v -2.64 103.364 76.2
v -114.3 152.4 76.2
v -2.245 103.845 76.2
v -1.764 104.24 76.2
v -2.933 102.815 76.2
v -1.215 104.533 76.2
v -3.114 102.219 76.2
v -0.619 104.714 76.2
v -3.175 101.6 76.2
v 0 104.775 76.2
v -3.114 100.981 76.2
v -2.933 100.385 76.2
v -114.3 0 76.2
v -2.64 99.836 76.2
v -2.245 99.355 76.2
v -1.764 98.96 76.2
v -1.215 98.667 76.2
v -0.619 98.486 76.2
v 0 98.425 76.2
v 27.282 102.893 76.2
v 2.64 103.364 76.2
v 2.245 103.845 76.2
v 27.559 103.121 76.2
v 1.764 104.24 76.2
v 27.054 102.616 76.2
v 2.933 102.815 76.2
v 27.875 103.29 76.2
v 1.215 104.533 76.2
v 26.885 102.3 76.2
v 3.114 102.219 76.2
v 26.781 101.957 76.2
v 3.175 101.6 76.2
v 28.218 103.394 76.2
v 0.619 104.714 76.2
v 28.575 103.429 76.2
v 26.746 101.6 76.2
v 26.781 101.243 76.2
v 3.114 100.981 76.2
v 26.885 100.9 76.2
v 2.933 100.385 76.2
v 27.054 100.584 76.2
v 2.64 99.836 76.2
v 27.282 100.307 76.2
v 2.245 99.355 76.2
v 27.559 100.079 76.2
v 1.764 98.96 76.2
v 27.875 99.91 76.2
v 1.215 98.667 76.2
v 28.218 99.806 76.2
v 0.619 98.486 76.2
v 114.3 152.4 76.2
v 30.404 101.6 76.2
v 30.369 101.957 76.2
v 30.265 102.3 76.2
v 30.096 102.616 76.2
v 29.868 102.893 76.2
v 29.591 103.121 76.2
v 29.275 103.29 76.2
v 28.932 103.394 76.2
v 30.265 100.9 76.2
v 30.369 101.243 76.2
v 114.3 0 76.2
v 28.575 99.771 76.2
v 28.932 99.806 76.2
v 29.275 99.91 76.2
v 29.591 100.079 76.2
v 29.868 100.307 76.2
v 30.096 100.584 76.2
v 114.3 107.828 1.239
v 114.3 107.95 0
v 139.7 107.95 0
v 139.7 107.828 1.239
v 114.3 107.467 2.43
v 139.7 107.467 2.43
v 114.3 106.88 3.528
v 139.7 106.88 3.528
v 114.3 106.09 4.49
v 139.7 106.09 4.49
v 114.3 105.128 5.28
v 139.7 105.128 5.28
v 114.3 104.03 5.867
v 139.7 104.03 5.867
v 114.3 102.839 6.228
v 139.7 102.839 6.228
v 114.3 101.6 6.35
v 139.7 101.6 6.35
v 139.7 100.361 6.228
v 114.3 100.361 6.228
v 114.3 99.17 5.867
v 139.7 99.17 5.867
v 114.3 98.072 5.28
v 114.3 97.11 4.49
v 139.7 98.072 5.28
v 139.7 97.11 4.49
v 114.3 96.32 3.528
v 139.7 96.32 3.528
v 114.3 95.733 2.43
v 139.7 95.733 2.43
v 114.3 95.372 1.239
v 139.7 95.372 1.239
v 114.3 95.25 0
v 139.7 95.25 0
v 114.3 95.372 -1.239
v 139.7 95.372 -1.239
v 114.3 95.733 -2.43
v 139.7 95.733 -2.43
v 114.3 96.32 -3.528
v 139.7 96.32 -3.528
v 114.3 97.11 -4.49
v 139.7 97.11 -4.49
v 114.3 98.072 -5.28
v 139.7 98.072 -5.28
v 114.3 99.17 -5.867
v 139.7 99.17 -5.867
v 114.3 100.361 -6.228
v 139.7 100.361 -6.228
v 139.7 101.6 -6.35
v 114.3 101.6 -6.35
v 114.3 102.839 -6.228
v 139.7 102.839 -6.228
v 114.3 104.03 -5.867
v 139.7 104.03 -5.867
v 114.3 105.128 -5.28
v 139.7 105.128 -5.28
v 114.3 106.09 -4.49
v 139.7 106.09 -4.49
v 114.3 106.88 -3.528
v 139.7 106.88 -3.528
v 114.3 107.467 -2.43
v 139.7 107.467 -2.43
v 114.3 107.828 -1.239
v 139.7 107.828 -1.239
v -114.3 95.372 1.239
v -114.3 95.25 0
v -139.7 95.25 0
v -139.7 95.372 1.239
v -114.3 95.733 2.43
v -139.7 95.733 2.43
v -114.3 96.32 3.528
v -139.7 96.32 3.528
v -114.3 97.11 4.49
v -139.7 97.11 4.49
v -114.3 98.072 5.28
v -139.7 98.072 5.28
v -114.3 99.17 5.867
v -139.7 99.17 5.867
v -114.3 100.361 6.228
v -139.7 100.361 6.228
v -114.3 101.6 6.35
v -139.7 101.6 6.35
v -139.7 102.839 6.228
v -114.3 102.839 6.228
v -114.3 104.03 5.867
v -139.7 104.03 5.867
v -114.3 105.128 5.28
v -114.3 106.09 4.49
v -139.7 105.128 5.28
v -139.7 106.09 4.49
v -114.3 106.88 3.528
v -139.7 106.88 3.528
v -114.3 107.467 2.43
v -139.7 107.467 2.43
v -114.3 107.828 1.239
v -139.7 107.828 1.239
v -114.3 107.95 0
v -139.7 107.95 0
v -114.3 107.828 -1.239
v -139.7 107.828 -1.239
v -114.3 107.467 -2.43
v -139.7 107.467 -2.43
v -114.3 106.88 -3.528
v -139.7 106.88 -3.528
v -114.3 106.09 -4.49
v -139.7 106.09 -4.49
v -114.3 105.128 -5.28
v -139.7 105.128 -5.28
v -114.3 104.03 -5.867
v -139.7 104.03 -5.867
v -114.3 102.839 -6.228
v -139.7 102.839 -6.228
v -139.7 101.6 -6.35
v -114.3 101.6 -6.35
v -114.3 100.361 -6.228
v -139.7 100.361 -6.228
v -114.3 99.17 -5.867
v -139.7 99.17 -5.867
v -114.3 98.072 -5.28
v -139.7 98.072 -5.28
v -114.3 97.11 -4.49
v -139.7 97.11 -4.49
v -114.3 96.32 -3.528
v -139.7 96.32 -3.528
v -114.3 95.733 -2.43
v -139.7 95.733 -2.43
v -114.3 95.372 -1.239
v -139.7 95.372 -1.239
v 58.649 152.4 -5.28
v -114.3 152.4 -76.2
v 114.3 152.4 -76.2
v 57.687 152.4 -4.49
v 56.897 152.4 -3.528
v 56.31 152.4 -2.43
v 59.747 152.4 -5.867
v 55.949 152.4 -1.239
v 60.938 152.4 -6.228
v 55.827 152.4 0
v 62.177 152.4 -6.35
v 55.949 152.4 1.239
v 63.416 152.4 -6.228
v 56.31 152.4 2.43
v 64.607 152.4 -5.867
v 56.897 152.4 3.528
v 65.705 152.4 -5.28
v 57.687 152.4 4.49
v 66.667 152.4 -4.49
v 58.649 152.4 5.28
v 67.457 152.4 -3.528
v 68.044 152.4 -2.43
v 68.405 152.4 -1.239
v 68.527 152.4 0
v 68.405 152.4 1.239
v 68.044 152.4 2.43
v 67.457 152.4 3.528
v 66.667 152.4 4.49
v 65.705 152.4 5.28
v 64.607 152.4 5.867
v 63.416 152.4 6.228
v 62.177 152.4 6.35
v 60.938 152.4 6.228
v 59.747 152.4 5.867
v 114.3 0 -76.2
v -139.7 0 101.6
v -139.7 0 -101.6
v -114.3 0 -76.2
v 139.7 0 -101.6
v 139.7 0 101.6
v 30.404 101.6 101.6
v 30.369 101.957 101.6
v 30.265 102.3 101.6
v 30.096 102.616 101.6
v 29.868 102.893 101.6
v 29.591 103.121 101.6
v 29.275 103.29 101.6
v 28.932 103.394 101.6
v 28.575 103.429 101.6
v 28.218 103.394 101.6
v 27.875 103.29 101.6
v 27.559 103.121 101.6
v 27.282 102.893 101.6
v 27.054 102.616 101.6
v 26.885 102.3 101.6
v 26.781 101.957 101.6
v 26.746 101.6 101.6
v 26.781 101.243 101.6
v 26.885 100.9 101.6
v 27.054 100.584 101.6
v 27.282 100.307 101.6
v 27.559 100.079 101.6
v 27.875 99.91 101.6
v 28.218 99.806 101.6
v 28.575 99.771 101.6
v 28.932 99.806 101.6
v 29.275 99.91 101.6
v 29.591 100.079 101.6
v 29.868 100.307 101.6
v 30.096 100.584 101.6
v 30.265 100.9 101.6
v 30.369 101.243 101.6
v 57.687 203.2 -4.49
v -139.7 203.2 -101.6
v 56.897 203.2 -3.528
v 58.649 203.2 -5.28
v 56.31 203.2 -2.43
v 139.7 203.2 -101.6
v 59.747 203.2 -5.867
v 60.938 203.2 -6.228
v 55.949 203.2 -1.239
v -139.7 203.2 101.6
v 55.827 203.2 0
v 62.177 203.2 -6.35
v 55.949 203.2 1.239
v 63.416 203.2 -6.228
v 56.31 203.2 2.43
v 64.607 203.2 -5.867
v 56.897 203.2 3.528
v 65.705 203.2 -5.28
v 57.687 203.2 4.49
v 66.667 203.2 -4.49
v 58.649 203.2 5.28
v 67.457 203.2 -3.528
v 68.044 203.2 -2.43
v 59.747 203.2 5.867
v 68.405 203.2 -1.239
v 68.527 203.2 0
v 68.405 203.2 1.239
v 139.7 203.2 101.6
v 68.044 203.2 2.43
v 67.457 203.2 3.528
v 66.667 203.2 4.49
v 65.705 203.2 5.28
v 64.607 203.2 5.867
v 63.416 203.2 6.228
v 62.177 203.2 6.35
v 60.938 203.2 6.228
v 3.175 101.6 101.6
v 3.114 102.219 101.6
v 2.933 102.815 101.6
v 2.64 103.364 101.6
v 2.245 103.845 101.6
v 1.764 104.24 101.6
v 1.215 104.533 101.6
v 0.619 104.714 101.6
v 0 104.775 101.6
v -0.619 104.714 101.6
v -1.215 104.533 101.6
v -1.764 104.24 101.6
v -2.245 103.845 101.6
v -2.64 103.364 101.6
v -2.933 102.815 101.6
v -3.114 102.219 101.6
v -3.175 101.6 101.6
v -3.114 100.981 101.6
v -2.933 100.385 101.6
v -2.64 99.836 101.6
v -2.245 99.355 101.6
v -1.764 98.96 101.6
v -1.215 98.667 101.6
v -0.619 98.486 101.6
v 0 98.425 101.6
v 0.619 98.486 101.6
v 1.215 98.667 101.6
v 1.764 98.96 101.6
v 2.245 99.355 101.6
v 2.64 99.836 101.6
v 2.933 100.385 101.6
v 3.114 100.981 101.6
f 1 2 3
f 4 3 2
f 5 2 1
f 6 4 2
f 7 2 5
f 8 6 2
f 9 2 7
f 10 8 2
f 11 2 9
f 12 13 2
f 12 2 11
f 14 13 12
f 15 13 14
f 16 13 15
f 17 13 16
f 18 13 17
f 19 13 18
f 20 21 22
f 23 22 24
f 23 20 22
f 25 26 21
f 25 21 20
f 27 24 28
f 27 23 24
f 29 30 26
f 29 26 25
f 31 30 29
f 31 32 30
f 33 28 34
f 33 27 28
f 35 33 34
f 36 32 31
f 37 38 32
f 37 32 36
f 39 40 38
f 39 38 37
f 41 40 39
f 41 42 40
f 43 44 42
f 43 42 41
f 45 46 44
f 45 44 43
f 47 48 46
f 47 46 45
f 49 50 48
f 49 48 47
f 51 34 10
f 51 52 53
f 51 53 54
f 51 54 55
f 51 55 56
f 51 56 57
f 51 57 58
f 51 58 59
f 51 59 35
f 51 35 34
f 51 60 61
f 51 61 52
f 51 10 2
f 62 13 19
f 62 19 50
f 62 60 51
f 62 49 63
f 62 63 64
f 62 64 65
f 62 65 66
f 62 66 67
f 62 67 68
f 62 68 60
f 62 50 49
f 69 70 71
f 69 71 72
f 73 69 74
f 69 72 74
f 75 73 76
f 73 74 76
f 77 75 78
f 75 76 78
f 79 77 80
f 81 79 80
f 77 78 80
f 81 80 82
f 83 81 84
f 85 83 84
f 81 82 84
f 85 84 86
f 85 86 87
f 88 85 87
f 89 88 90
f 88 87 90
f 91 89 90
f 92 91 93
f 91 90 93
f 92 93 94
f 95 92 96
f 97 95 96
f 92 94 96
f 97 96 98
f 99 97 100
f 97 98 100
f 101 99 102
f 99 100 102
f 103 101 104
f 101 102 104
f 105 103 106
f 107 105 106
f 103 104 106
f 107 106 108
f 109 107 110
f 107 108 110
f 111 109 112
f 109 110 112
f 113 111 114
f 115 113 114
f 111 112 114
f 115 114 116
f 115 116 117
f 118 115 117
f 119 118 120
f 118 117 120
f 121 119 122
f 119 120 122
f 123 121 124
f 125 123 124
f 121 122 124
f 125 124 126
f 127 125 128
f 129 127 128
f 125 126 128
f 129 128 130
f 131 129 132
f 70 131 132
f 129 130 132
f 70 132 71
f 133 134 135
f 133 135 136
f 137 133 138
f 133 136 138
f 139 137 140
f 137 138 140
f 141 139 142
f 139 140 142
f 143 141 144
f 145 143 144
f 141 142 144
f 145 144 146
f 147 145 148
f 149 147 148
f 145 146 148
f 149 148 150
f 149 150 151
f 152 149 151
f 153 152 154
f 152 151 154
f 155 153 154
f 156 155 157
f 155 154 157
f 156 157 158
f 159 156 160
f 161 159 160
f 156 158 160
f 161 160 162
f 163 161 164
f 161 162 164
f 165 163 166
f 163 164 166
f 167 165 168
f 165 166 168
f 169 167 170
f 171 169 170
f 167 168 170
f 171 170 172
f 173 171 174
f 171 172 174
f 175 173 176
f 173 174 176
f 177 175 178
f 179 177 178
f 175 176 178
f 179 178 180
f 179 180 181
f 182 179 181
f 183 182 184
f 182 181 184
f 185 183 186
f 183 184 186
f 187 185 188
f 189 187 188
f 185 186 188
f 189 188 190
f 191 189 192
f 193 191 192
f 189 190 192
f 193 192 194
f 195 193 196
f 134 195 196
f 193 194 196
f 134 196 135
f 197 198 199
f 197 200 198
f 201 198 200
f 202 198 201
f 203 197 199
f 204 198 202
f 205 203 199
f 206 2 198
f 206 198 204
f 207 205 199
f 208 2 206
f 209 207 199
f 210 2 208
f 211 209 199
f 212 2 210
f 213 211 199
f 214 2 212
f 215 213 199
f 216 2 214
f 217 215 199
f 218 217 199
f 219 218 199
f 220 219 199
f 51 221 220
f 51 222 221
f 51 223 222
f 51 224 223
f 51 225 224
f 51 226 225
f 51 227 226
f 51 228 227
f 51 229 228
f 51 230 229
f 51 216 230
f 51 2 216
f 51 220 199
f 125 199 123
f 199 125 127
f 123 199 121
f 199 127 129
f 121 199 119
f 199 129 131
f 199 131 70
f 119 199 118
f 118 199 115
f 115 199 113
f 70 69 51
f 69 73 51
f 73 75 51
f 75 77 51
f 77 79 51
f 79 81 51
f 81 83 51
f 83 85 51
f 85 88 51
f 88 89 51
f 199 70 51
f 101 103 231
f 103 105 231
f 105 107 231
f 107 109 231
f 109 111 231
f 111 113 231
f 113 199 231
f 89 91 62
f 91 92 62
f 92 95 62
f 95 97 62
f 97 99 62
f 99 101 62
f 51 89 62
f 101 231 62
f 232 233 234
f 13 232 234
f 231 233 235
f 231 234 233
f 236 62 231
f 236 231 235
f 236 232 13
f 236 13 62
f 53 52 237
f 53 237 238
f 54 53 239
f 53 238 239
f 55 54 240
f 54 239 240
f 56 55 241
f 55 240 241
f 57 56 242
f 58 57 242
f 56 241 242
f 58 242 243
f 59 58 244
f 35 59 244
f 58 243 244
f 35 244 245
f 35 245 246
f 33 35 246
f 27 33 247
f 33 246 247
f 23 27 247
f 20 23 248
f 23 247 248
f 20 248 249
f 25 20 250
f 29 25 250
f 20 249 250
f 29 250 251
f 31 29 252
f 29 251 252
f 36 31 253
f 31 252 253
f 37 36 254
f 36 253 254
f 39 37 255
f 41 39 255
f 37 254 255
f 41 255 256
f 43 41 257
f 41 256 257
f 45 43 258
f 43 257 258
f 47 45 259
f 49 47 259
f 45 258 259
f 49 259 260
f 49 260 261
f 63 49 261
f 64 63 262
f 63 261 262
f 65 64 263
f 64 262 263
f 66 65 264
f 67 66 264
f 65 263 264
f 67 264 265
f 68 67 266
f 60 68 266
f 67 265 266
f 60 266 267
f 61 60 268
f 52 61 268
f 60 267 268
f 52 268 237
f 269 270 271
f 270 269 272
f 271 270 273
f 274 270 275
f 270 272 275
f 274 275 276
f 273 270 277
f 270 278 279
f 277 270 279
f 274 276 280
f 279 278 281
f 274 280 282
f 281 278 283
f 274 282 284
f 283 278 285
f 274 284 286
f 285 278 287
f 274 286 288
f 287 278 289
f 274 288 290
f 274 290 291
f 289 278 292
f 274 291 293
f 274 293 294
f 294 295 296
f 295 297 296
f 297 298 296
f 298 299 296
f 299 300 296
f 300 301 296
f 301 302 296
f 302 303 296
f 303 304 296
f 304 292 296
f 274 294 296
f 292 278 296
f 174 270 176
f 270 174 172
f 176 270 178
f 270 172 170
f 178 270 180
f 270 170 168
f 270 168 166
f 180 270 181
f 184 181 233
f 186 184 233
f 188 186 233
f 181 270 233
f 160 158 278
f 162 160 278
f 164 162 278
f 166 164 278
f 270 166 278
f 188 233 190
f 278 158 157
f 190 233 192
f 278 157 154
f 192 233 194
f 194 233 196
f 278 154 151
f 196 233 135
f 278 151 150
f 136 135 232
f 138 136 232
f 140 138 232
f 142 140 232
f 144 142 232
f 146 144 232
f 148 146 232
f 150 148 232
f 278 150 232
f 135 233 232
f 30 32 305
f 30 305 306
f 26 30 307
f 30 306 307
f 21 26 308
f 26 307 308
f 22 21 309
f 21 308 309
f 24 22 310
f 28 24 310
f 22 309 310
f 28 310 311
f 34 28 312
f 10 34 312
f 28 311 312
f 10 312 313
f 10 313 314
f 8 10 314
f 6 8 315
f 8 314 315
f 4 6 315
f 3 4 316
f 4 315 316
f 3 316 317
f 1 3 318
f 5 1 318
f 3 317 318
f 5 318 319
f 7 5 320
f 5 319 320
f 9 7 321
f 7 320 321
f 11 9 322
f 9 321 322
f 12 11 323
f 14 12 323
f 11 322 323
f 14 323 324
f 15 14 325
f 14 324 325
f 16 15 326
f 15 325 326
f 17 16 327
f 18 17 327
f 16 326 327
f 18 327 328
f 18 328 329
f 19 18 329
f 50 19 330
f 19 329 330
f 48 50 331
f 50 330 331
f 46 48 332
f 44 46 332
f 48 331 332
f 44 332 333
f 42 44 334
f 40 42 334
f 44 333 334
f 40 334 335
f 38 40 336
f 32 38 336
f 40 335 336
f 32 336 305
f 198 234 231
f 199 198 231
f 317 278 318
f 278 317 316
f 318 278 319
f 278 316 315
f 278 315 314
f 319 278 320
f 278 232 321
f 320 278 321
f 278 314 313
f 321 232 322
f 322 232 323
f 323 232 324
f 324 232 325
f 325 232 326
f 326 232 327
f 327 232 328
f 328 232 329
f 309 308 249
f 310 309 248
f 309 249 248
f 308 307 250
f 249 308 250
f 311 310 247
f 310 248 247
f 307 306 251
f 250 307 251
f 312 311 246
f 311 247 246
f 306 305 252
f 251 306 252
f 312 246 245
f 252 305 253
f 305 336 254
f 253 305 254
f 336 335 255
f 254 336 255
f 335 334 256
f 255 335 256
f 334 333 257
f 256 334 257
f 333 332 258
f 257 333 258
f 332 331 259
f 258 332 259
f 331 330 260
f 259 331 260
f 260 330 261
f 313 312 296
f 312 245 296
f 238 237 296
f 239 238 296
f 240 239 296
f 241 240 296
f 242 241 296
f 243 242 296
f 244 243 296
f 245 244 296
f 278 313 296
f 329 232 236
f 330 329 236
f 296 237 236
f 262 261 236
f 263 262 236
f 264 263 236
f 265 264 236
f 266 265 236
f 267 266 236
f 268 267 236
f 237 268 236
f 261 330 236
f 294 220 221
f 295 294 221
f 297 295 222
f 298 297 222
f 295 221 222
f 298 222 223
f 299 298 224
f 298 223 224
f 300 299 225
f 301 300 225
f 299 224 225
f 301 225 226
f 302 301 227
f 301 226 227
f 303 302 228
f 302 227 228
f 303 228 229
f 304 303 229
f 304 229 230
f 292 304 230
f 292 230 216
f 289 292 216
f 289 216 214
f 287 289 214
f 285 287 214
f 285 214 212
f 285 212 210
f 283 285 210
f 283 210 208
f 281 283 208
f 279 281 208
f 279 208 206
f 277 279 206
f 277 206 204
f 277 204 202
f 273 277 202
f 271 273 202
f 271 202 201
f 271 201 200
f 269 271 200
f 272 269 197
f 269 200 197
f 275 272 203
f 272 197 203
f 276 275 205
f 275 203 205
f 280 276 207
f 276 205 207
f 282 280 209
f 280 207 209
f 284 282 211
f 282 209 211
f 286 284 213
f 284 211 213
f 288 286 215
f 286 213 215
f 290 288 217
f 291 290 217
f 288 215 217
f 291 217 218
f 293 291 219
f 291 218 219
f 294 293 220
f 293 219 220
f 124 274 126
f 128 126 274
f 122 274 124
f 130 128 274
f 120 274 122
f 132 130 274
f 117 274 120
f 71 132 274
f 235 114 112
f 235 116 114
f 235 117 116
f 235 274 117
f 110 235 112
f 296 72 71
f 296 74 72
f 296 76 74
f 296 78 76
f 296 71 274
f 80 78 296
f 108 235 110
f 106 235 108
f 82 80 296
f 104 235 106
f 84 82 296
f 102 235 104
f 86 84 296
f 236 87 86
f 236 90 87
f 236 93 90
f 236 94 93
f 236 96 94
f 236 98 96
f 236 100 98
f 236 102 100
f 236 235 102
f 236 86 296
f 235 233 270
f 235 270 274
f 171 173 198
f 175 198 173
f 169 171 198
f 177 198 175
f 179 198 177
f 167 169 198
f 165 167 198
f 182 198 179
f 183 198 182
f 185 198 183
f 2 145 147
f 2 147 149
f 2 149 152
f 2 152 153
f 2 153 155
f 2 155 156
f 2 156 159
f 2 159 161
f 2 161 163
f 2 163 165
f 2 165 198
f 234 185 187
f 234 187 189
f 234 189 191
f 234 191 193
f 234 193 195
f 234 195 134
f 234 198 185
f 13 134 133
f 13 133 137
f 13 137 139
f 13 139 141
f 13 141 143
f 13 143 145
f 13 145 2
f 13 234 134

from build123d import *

# Parameters (mm, degrees)
F0_W      = 279.4
F0_H      = 203.2
F1_DEPTH  = 203.2
F5_W      = 228.6
F5_H      = 152.4
F6_DEPTH  = 152.4
F2_R      = 3.175
F2_R_2    = 1.8288
F7_DEPTH  = 25.4
F3_R      = 6.35
F8_DEPTH  = 25.4
F4_R      = 6.35
F9_DEPTH  = 25.4
F10_R     = 6.35
F11_DEPTH = 254


with BuildPart() as f1:
    # F0 (on Front) → F1 (new body)
    with BuildSketch(Plane.XZ):
        Rectangle(F0_W, F0_H)
    extrude(amount=-F1_DEPTH)

    # F5 (on Front) → F6 (cut)
    with BuildSketch(Plane.XZ):
        Rectangle(F5_W, F5_H)
    extrude(amount=-F6_DEPTH, mode=Mode.SUBTRACT)

    # F2 (on face) → F7 (cut)
    with BuildSketch(Plane.XY.offset(101.6)):
        with Locations((0, 101.6)):
            Circle(F2_R)
        with Locations((28.575, 101.6)):
            Circle(F2_R_2)
    extrude(amount=-F7_DEPTH, mode=Mode.SUBTRACT)

    # F3 (on face) → F8 (cut)
    with BuildSketch(Plane.YZ.offset(139.7)):
        with Locations((101.6, 0)):
            Circle(F3_R)
    extrude(amount=-F8_DEPTH, mode=Mode.SUBTRACT)

    # F4 (on face) → F9 (cut)
    with BuildSketch(Plane(origin=(-139.7, 0, 0), x_dir=(0, -1, 0), z_dir=(-1, 0, 0))):
        with Locations((-101.6, 0)):
            Circle(F4_R)
    extrude(amount=-F9_DEPTH, mode=Mode.SUBTRACT)

    # F10 (on Front) → F11 (cut)
    with BuildSketch(Plane.XZ):
        with Locations((62.176916, 0)):
            Circle(F10_R)
    extrude(amount=-F11_DEPTH, mode=Mode.SUBTRACT)


solid = f1.part
